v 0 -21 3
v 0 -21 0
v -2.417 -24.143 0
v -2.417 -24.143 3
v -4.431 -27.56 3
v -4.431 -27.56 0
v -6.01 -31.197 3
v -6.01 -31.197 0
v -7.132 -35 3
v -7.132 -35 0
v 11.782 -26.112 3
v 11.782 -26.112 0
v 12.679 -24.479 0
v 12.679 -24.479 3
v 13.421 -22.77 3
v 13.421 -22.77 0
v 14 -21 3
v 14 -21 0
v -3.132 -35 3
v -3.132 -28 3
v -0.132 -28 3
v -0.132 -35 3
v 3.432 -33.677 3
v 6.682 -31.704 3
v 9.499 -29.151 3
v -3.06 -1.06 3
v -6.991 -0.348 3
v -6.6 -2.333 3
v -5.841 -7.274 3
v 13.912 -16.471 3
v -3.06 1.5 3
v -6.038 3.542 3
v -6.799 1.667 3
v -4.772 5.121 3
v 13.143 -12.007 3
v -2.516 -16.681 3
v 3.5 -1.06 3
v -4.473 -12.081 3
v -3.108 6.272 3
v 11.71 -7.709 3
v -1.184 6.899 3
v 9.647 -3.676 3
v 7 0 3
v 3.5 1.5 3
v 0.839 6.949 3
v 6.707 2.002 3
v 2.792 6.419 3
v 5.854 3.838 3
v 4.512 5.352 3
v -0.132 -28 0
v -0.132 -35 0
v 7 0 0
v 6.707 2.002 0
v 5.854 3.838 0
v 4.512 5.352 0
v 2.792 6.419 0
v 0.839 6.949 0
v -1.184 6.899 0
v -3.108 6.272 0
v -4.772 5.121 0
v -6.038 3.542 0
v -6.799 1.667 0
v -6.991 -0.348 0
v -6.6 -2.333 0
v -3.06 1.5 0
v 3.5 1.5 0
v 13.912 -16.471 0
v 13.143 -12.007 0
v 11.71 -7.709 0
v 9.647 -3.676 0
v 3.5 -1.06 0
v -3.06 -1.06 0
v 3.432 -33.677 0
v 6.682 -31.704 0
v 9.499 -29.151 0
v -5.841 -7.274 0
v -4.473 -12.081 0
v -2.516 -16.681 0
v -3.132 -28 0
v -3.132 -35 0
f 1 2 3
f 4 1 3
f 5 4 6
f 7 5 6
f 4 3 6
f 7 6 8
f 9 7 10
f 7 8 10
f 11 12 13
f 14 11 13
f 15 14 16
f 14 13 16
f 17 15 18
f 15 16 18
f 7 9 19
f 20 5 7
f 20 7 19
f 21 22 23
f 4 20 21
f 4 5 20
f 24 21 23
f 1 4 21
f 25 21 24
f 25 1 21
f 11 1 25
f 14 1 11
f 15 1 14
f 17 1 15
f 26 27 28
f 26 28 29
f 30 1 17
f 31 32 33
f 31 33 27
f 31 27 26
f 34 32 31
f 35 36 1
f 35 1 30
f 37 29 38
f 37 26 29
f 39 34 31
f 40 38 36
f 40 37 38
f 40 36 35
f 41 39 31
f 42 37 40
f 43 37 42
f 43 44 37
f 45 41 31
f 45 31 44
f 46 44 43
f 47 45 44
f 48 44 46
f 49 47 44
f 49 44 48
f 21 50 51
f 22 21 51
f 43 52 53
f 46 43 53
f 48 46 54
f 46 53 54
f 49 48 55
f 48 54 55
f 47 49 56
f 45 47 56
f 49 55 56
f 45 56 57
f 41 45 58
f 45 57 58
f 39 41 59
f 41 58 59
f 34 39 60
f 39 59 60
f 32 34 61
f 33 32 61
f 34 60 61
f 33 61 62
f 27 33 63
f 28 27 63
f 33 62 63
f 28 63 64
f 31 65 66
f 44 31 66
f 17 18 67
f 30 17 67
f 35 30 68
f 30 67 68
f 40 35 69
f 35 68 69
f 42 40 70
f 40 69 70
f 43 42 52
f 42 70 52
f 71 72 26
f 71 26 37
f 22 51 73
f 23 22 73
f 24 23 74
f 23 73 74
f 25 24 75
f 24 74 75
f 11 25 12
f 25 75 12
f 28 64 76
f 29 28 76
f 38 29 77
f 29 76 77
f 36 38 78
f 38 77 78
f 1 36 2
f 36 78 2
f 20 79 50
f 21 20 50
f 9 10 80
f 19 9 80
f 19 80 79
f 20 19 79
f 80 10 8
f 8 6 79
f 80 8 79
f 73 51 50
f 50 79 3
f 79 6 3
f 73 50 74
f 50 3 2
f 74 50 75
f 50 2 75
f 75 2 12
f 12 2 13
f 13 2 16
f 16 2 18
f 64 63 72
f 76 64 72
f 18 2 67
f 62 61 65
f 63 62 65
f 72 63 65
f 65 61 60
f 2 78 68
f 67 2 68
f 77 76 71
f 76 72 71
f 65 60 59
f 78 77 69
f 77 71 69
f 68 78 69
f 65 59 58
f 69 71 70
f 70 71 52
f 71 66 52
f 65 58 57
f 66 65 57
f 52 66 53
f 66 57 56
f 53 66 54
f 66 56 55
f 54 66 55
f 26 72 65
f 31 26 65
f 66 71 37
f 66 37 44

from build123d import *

# Parameters (mm, degrees)
CROQUIS1_W              = 6.56
CROQUIS1_H              = 2.56
SALIENTE_EXTRUIR1_DEPTH = 3


with BuildPart() as part:
    # Croquis1 → Saliente-Extruir1 (new body)
    # profile 1 of 4: a face of its own
    with BuildSketch(Plane.XY):
        with BuildLine():
            ThreePointArc((-6.599663594, -2.333332476), (-4.473021287, -12.08145136), (0, -21))
            ThreePointArc((0, -21), (7, -14), (14, -21))
            ThreePointArc((14, -21), (12.507710809, -9.830763064), (7, 0))
            ThreePointArc((7, 0), (-1.183713403, 6.899189994), (-6.599663594, -2.333332476))
        make_face()
        with Locations((0.22, 0.22)):
            Rectangle(CROQUIS1_W, CROQUIS1_H, mode=Mode.SUBTRACT)
    # profile 2 of 4: a face of its own
    with BuildSketch(Plane.XY):
        with BuildLine():
            ThreePointArc((14, -21), (7, -14), (0, -21))
            Line((0, -21), (14, -21))
        make_face()
    # profile 3 of 4: a face of its own
    with BuildSketch(Plane.XY):
        with BuildLine():
            Line((14, -21), (0, -21))
            ThreePointArc((0, -21), (4.213945985, -27.421674472), (11.782258008, -26.111751984))
            ThreePointArc((11.782258008, -26.111751984), (13.070021332, -23.633488722), (14, -21))
        make_face()
    # profile 4 of 4: a face of its own
    with BuildSketch(Plane.XY):
        with BuildLine():
            Line((-7.131748217, -35), (-3.131748217, -35))
            Line((-3.131748217, -35), (-3.131748217, -28))
            Line((-3.131748217, -28), (-0.131748217, -28))
            Line((-0.131748217, -28), (-0.131748217, -35))
            ThreePointArc((-0.131748217, -35), (6.681647081, -31.703803211), (11.782258008, -26.111751984))
            ThreePointArc((11.782258008, -26.111751984), (4.213945985, -27.421674472), (0, -21))
            ThreePointArc((0, -21), (-4.430558492, -27.559520621), (-7.131748217, -35))
        make_face()
    extrude(amount=SALIENTE_EXTRUIR1_DEPTH)


solid = part.part
